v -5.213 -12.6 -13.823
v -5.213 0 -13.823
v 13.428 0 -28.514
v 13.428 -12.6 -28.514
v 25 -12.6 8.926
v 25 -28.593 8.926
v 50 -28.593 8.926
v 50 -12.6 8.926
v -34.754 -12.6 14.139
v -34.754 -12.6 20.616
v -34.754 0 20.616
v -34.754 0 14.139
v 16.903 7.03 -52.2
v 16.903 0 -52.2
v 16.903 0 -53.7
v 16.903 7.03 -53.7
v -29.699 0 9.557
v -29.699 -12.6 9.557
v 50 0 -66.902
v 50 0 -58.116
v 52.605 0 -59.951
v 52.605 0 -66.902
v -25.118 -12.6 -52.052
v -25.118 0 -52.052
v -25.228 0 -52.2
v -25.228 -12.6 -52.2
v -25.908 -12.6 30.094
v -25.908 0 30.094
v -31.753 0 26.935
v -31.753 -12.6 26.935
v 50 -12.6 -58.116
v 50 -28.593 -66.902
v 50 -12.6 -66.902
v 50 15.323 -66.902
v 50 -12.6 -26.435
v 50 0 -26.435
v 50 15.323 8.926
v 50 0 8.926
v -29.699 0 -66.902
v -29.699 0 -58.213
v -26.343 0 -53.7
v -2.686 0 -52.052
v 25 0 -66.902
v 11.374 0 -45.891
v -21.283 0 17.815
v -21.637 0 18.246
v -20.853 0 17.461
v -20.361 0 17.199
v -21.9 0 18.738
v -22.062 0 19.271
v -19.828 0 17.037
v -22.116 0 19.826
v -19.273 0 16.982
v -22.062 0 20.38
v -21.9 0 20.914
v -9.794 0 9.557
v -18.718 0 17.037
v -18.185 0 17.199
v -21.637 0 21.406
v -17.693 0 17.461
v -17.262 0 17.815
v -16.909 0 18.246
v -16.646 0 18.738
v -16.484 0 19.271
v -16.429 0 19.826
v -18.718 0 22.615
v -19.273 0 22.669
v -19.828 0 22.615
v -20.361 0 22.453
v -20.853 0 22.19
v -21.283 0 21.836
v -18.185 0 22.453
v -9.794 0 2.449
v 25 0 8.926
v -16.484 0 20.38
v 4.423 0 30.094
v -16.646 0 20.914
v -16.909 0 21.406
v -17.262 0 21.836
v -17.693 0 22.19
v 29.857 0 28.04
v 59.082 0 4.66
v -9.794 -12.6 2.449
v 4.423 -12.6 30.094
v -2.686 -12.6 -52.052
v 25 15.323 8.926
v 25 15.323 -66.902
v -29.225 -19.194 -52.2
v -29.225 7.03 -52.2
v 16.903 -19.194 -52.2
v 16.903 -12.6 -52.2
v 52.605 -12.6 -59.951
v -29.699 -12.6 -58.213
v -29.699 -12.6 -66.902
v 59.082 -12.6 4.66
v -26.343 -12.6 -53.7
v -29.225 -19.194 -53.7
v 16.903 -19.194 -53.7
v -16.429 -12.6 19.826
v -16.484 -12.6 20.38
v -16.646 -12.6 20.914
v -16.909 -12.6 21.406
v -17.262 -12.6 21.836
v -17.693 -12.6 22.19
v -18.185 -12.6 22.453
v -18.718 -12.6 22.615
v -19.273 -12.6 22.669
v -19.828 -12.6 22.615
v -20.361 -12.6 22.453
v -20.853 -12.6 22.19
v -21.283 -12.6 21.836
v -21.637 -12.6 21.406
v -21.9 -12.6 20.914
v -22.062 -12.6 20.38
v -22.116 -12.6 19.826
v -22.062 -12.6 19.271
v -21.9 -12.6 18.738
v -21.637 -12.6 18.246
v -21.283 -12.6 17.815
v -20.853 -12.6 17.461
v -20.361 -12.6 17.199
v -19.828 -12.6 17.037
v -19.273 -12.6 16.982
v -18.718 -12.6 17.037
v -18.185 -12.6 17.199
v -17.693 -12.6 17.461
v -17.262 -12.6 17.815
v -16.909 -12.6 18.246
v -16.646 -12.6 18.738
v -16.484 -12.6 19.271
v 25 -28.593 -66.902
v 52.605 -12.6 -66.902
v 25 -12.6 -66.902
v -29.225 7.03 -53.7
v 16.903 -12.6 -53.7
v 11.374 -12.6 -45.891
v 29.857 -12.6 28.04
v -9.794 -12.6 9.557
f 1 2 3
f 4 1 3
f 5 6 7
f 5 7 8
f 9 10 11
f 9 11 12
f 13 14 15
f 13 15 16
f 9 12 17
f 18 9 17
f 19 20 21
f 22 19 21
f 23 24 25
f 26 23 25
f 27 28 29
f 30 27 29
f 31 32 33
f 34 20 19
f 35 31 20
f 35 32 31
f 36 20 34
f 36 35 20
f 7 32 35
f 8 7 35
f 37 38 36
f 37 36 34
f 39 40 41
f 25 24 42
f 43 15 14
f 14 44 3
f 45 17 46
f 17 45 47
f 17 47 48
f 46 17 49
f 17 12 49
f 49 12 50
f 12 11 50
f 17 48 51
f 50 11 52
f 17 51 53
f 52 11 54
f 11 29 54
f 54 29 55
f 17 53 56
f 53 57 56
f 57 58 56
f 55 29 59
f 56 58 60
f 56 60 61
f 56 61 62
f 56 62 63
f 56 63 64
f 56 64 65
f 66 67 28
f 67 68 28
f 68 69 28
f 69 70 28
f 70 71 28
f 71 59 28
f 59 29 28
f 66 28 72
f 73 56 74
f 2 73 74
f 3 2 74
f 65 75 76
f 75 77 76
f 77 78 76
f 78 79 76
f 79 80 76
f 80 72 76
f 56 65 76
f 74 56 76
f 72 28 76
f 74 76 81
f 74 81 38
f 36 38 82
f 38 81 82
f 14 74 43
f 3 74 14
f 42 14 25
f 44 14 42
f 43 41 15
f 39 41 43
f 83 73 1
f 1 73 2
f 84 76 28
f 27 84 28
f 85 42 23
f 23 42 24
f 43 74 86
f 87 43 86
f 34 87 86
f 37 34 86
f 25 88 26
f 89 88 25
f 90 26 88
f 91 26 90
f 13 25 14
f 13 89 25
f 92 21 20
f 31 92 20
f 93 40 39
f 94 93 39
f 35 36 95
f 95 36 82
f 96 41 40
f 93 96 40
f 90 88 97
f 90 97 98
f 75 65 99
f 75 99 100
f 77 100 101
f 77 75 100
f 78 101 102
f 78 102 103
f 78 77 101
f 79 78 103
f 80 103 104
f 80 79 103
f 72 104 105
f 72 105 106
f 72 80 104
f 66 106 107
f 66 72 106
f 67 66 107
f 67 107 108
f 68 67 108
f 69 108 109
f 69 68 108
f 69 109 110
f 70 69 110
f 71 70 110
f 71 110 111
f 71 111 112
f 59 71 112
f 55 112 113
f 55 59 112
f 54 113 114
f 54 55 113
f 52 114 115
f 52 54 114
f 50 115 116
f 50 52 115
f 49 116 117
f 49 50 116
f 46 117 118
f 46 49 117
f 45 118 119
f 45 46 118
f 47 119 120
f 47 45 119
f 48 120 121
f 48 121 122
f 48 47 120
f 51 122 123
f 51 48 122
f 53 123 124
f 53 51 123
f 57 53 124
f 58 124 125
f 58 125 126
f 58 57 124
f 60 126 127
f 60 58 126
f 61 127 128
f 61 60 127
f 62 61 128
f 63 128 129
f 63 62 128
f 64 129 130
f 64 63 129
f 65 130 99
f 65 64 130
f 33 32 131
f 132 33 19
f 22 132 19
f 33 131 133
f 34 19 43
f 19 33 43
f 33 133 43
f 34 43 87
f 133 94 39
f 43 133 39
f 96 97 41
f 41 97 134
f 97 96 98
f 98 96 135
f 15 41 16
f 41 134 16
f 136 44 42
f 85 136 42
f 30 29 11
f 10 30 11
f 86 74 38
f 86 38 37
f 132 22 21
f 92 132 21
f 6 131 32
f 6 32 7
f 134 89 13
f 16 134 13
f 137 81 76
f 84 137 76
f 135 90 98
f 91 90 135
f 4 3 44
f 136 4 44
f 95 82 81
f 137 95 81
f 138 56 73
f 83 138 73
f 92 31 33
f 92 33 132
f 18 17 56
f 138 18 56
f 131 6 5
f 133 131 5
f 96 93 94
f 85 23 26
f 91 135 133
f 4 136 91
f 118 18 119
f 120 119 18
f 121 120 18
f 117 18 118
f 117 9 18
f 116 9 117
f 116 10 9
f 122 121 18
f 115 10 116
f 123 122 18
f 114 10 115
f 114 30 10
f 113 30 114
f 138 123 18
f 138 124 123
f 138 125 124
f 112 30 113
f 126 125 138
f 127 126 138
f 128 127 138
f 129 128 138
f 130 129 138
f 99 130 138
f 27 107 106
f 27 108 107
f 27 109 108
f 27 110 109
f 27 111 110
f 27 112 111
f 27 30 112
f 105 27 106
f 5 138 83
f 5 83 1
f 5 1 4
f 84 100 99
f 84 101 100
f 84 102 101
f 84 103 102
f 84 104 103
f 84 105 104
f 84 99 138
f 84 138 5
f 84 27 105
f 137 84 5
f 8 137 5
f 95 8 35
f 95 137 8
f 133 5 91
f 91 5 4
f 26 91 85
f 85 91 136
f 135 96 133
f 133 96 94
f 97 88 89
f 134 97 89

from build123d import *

# Parameters (mm, degrees)
F0_R     = 2.843531
F1_DEPTH = 12.6
F3_W     = 43.916751
F3_H     = 75.827486
F4_DEPTH = 25
F6_W     = 46.128386
F6_H     = 26.223674
F7_DEPTH = 1.5


with BuildPart() as f1:
    # F0 (on Front) → F1 (new body)
    with BuildSketch(Plane.XZ):
        Polygon((52.60532, -59.951108), (45.654465, -55.053912), (49.761787, -27.250502), (59.082251, 4.660231), (29.857071, 28.040372), (4.423271, 30.094033), (-25.907725, 30.094033), (-31.752758, 26.934555), (-34.754265, 20.615598), (-34.754265, 14.138667), (-29.699098, 9.557423), (-9.794383, 9.557423), (-9.794383, 2.448596), (-5.21314, -13.822719), (13.427783, -28.514294), (11.374122, -45.891427), (-2.685557, -52.052412), (-25.117856, -52.052412), (-29.699098, -58.21339), (-29.699098, -66.901959), (52.60532, -66.901959), align=None)
        with Locations((-19.272819, 19.825729)):
            Circle(F0_R, mode=Mode.SUBTRACT)
    extrude(amount=F1_DEPTH)

    # F3 (on offset) → F4 (join)
    with BuildSketch(Plane.YZ.offset(25)):
        with Locations((-6.634905, -28.988216)):
            Rectangle(F3_W, F3_H)
    extrude(amount=F4_DEPTH)

    # F6 (on offset) → F7 (join)
    with BuildSketch(Plane.XY.offset(-52.2)):
        with Locations((-6.160983, -6.081997)):
            Rectangle(F6_W, F6_H)
    extrude(amount=-F7_DEPTH)


solid = f1.part
